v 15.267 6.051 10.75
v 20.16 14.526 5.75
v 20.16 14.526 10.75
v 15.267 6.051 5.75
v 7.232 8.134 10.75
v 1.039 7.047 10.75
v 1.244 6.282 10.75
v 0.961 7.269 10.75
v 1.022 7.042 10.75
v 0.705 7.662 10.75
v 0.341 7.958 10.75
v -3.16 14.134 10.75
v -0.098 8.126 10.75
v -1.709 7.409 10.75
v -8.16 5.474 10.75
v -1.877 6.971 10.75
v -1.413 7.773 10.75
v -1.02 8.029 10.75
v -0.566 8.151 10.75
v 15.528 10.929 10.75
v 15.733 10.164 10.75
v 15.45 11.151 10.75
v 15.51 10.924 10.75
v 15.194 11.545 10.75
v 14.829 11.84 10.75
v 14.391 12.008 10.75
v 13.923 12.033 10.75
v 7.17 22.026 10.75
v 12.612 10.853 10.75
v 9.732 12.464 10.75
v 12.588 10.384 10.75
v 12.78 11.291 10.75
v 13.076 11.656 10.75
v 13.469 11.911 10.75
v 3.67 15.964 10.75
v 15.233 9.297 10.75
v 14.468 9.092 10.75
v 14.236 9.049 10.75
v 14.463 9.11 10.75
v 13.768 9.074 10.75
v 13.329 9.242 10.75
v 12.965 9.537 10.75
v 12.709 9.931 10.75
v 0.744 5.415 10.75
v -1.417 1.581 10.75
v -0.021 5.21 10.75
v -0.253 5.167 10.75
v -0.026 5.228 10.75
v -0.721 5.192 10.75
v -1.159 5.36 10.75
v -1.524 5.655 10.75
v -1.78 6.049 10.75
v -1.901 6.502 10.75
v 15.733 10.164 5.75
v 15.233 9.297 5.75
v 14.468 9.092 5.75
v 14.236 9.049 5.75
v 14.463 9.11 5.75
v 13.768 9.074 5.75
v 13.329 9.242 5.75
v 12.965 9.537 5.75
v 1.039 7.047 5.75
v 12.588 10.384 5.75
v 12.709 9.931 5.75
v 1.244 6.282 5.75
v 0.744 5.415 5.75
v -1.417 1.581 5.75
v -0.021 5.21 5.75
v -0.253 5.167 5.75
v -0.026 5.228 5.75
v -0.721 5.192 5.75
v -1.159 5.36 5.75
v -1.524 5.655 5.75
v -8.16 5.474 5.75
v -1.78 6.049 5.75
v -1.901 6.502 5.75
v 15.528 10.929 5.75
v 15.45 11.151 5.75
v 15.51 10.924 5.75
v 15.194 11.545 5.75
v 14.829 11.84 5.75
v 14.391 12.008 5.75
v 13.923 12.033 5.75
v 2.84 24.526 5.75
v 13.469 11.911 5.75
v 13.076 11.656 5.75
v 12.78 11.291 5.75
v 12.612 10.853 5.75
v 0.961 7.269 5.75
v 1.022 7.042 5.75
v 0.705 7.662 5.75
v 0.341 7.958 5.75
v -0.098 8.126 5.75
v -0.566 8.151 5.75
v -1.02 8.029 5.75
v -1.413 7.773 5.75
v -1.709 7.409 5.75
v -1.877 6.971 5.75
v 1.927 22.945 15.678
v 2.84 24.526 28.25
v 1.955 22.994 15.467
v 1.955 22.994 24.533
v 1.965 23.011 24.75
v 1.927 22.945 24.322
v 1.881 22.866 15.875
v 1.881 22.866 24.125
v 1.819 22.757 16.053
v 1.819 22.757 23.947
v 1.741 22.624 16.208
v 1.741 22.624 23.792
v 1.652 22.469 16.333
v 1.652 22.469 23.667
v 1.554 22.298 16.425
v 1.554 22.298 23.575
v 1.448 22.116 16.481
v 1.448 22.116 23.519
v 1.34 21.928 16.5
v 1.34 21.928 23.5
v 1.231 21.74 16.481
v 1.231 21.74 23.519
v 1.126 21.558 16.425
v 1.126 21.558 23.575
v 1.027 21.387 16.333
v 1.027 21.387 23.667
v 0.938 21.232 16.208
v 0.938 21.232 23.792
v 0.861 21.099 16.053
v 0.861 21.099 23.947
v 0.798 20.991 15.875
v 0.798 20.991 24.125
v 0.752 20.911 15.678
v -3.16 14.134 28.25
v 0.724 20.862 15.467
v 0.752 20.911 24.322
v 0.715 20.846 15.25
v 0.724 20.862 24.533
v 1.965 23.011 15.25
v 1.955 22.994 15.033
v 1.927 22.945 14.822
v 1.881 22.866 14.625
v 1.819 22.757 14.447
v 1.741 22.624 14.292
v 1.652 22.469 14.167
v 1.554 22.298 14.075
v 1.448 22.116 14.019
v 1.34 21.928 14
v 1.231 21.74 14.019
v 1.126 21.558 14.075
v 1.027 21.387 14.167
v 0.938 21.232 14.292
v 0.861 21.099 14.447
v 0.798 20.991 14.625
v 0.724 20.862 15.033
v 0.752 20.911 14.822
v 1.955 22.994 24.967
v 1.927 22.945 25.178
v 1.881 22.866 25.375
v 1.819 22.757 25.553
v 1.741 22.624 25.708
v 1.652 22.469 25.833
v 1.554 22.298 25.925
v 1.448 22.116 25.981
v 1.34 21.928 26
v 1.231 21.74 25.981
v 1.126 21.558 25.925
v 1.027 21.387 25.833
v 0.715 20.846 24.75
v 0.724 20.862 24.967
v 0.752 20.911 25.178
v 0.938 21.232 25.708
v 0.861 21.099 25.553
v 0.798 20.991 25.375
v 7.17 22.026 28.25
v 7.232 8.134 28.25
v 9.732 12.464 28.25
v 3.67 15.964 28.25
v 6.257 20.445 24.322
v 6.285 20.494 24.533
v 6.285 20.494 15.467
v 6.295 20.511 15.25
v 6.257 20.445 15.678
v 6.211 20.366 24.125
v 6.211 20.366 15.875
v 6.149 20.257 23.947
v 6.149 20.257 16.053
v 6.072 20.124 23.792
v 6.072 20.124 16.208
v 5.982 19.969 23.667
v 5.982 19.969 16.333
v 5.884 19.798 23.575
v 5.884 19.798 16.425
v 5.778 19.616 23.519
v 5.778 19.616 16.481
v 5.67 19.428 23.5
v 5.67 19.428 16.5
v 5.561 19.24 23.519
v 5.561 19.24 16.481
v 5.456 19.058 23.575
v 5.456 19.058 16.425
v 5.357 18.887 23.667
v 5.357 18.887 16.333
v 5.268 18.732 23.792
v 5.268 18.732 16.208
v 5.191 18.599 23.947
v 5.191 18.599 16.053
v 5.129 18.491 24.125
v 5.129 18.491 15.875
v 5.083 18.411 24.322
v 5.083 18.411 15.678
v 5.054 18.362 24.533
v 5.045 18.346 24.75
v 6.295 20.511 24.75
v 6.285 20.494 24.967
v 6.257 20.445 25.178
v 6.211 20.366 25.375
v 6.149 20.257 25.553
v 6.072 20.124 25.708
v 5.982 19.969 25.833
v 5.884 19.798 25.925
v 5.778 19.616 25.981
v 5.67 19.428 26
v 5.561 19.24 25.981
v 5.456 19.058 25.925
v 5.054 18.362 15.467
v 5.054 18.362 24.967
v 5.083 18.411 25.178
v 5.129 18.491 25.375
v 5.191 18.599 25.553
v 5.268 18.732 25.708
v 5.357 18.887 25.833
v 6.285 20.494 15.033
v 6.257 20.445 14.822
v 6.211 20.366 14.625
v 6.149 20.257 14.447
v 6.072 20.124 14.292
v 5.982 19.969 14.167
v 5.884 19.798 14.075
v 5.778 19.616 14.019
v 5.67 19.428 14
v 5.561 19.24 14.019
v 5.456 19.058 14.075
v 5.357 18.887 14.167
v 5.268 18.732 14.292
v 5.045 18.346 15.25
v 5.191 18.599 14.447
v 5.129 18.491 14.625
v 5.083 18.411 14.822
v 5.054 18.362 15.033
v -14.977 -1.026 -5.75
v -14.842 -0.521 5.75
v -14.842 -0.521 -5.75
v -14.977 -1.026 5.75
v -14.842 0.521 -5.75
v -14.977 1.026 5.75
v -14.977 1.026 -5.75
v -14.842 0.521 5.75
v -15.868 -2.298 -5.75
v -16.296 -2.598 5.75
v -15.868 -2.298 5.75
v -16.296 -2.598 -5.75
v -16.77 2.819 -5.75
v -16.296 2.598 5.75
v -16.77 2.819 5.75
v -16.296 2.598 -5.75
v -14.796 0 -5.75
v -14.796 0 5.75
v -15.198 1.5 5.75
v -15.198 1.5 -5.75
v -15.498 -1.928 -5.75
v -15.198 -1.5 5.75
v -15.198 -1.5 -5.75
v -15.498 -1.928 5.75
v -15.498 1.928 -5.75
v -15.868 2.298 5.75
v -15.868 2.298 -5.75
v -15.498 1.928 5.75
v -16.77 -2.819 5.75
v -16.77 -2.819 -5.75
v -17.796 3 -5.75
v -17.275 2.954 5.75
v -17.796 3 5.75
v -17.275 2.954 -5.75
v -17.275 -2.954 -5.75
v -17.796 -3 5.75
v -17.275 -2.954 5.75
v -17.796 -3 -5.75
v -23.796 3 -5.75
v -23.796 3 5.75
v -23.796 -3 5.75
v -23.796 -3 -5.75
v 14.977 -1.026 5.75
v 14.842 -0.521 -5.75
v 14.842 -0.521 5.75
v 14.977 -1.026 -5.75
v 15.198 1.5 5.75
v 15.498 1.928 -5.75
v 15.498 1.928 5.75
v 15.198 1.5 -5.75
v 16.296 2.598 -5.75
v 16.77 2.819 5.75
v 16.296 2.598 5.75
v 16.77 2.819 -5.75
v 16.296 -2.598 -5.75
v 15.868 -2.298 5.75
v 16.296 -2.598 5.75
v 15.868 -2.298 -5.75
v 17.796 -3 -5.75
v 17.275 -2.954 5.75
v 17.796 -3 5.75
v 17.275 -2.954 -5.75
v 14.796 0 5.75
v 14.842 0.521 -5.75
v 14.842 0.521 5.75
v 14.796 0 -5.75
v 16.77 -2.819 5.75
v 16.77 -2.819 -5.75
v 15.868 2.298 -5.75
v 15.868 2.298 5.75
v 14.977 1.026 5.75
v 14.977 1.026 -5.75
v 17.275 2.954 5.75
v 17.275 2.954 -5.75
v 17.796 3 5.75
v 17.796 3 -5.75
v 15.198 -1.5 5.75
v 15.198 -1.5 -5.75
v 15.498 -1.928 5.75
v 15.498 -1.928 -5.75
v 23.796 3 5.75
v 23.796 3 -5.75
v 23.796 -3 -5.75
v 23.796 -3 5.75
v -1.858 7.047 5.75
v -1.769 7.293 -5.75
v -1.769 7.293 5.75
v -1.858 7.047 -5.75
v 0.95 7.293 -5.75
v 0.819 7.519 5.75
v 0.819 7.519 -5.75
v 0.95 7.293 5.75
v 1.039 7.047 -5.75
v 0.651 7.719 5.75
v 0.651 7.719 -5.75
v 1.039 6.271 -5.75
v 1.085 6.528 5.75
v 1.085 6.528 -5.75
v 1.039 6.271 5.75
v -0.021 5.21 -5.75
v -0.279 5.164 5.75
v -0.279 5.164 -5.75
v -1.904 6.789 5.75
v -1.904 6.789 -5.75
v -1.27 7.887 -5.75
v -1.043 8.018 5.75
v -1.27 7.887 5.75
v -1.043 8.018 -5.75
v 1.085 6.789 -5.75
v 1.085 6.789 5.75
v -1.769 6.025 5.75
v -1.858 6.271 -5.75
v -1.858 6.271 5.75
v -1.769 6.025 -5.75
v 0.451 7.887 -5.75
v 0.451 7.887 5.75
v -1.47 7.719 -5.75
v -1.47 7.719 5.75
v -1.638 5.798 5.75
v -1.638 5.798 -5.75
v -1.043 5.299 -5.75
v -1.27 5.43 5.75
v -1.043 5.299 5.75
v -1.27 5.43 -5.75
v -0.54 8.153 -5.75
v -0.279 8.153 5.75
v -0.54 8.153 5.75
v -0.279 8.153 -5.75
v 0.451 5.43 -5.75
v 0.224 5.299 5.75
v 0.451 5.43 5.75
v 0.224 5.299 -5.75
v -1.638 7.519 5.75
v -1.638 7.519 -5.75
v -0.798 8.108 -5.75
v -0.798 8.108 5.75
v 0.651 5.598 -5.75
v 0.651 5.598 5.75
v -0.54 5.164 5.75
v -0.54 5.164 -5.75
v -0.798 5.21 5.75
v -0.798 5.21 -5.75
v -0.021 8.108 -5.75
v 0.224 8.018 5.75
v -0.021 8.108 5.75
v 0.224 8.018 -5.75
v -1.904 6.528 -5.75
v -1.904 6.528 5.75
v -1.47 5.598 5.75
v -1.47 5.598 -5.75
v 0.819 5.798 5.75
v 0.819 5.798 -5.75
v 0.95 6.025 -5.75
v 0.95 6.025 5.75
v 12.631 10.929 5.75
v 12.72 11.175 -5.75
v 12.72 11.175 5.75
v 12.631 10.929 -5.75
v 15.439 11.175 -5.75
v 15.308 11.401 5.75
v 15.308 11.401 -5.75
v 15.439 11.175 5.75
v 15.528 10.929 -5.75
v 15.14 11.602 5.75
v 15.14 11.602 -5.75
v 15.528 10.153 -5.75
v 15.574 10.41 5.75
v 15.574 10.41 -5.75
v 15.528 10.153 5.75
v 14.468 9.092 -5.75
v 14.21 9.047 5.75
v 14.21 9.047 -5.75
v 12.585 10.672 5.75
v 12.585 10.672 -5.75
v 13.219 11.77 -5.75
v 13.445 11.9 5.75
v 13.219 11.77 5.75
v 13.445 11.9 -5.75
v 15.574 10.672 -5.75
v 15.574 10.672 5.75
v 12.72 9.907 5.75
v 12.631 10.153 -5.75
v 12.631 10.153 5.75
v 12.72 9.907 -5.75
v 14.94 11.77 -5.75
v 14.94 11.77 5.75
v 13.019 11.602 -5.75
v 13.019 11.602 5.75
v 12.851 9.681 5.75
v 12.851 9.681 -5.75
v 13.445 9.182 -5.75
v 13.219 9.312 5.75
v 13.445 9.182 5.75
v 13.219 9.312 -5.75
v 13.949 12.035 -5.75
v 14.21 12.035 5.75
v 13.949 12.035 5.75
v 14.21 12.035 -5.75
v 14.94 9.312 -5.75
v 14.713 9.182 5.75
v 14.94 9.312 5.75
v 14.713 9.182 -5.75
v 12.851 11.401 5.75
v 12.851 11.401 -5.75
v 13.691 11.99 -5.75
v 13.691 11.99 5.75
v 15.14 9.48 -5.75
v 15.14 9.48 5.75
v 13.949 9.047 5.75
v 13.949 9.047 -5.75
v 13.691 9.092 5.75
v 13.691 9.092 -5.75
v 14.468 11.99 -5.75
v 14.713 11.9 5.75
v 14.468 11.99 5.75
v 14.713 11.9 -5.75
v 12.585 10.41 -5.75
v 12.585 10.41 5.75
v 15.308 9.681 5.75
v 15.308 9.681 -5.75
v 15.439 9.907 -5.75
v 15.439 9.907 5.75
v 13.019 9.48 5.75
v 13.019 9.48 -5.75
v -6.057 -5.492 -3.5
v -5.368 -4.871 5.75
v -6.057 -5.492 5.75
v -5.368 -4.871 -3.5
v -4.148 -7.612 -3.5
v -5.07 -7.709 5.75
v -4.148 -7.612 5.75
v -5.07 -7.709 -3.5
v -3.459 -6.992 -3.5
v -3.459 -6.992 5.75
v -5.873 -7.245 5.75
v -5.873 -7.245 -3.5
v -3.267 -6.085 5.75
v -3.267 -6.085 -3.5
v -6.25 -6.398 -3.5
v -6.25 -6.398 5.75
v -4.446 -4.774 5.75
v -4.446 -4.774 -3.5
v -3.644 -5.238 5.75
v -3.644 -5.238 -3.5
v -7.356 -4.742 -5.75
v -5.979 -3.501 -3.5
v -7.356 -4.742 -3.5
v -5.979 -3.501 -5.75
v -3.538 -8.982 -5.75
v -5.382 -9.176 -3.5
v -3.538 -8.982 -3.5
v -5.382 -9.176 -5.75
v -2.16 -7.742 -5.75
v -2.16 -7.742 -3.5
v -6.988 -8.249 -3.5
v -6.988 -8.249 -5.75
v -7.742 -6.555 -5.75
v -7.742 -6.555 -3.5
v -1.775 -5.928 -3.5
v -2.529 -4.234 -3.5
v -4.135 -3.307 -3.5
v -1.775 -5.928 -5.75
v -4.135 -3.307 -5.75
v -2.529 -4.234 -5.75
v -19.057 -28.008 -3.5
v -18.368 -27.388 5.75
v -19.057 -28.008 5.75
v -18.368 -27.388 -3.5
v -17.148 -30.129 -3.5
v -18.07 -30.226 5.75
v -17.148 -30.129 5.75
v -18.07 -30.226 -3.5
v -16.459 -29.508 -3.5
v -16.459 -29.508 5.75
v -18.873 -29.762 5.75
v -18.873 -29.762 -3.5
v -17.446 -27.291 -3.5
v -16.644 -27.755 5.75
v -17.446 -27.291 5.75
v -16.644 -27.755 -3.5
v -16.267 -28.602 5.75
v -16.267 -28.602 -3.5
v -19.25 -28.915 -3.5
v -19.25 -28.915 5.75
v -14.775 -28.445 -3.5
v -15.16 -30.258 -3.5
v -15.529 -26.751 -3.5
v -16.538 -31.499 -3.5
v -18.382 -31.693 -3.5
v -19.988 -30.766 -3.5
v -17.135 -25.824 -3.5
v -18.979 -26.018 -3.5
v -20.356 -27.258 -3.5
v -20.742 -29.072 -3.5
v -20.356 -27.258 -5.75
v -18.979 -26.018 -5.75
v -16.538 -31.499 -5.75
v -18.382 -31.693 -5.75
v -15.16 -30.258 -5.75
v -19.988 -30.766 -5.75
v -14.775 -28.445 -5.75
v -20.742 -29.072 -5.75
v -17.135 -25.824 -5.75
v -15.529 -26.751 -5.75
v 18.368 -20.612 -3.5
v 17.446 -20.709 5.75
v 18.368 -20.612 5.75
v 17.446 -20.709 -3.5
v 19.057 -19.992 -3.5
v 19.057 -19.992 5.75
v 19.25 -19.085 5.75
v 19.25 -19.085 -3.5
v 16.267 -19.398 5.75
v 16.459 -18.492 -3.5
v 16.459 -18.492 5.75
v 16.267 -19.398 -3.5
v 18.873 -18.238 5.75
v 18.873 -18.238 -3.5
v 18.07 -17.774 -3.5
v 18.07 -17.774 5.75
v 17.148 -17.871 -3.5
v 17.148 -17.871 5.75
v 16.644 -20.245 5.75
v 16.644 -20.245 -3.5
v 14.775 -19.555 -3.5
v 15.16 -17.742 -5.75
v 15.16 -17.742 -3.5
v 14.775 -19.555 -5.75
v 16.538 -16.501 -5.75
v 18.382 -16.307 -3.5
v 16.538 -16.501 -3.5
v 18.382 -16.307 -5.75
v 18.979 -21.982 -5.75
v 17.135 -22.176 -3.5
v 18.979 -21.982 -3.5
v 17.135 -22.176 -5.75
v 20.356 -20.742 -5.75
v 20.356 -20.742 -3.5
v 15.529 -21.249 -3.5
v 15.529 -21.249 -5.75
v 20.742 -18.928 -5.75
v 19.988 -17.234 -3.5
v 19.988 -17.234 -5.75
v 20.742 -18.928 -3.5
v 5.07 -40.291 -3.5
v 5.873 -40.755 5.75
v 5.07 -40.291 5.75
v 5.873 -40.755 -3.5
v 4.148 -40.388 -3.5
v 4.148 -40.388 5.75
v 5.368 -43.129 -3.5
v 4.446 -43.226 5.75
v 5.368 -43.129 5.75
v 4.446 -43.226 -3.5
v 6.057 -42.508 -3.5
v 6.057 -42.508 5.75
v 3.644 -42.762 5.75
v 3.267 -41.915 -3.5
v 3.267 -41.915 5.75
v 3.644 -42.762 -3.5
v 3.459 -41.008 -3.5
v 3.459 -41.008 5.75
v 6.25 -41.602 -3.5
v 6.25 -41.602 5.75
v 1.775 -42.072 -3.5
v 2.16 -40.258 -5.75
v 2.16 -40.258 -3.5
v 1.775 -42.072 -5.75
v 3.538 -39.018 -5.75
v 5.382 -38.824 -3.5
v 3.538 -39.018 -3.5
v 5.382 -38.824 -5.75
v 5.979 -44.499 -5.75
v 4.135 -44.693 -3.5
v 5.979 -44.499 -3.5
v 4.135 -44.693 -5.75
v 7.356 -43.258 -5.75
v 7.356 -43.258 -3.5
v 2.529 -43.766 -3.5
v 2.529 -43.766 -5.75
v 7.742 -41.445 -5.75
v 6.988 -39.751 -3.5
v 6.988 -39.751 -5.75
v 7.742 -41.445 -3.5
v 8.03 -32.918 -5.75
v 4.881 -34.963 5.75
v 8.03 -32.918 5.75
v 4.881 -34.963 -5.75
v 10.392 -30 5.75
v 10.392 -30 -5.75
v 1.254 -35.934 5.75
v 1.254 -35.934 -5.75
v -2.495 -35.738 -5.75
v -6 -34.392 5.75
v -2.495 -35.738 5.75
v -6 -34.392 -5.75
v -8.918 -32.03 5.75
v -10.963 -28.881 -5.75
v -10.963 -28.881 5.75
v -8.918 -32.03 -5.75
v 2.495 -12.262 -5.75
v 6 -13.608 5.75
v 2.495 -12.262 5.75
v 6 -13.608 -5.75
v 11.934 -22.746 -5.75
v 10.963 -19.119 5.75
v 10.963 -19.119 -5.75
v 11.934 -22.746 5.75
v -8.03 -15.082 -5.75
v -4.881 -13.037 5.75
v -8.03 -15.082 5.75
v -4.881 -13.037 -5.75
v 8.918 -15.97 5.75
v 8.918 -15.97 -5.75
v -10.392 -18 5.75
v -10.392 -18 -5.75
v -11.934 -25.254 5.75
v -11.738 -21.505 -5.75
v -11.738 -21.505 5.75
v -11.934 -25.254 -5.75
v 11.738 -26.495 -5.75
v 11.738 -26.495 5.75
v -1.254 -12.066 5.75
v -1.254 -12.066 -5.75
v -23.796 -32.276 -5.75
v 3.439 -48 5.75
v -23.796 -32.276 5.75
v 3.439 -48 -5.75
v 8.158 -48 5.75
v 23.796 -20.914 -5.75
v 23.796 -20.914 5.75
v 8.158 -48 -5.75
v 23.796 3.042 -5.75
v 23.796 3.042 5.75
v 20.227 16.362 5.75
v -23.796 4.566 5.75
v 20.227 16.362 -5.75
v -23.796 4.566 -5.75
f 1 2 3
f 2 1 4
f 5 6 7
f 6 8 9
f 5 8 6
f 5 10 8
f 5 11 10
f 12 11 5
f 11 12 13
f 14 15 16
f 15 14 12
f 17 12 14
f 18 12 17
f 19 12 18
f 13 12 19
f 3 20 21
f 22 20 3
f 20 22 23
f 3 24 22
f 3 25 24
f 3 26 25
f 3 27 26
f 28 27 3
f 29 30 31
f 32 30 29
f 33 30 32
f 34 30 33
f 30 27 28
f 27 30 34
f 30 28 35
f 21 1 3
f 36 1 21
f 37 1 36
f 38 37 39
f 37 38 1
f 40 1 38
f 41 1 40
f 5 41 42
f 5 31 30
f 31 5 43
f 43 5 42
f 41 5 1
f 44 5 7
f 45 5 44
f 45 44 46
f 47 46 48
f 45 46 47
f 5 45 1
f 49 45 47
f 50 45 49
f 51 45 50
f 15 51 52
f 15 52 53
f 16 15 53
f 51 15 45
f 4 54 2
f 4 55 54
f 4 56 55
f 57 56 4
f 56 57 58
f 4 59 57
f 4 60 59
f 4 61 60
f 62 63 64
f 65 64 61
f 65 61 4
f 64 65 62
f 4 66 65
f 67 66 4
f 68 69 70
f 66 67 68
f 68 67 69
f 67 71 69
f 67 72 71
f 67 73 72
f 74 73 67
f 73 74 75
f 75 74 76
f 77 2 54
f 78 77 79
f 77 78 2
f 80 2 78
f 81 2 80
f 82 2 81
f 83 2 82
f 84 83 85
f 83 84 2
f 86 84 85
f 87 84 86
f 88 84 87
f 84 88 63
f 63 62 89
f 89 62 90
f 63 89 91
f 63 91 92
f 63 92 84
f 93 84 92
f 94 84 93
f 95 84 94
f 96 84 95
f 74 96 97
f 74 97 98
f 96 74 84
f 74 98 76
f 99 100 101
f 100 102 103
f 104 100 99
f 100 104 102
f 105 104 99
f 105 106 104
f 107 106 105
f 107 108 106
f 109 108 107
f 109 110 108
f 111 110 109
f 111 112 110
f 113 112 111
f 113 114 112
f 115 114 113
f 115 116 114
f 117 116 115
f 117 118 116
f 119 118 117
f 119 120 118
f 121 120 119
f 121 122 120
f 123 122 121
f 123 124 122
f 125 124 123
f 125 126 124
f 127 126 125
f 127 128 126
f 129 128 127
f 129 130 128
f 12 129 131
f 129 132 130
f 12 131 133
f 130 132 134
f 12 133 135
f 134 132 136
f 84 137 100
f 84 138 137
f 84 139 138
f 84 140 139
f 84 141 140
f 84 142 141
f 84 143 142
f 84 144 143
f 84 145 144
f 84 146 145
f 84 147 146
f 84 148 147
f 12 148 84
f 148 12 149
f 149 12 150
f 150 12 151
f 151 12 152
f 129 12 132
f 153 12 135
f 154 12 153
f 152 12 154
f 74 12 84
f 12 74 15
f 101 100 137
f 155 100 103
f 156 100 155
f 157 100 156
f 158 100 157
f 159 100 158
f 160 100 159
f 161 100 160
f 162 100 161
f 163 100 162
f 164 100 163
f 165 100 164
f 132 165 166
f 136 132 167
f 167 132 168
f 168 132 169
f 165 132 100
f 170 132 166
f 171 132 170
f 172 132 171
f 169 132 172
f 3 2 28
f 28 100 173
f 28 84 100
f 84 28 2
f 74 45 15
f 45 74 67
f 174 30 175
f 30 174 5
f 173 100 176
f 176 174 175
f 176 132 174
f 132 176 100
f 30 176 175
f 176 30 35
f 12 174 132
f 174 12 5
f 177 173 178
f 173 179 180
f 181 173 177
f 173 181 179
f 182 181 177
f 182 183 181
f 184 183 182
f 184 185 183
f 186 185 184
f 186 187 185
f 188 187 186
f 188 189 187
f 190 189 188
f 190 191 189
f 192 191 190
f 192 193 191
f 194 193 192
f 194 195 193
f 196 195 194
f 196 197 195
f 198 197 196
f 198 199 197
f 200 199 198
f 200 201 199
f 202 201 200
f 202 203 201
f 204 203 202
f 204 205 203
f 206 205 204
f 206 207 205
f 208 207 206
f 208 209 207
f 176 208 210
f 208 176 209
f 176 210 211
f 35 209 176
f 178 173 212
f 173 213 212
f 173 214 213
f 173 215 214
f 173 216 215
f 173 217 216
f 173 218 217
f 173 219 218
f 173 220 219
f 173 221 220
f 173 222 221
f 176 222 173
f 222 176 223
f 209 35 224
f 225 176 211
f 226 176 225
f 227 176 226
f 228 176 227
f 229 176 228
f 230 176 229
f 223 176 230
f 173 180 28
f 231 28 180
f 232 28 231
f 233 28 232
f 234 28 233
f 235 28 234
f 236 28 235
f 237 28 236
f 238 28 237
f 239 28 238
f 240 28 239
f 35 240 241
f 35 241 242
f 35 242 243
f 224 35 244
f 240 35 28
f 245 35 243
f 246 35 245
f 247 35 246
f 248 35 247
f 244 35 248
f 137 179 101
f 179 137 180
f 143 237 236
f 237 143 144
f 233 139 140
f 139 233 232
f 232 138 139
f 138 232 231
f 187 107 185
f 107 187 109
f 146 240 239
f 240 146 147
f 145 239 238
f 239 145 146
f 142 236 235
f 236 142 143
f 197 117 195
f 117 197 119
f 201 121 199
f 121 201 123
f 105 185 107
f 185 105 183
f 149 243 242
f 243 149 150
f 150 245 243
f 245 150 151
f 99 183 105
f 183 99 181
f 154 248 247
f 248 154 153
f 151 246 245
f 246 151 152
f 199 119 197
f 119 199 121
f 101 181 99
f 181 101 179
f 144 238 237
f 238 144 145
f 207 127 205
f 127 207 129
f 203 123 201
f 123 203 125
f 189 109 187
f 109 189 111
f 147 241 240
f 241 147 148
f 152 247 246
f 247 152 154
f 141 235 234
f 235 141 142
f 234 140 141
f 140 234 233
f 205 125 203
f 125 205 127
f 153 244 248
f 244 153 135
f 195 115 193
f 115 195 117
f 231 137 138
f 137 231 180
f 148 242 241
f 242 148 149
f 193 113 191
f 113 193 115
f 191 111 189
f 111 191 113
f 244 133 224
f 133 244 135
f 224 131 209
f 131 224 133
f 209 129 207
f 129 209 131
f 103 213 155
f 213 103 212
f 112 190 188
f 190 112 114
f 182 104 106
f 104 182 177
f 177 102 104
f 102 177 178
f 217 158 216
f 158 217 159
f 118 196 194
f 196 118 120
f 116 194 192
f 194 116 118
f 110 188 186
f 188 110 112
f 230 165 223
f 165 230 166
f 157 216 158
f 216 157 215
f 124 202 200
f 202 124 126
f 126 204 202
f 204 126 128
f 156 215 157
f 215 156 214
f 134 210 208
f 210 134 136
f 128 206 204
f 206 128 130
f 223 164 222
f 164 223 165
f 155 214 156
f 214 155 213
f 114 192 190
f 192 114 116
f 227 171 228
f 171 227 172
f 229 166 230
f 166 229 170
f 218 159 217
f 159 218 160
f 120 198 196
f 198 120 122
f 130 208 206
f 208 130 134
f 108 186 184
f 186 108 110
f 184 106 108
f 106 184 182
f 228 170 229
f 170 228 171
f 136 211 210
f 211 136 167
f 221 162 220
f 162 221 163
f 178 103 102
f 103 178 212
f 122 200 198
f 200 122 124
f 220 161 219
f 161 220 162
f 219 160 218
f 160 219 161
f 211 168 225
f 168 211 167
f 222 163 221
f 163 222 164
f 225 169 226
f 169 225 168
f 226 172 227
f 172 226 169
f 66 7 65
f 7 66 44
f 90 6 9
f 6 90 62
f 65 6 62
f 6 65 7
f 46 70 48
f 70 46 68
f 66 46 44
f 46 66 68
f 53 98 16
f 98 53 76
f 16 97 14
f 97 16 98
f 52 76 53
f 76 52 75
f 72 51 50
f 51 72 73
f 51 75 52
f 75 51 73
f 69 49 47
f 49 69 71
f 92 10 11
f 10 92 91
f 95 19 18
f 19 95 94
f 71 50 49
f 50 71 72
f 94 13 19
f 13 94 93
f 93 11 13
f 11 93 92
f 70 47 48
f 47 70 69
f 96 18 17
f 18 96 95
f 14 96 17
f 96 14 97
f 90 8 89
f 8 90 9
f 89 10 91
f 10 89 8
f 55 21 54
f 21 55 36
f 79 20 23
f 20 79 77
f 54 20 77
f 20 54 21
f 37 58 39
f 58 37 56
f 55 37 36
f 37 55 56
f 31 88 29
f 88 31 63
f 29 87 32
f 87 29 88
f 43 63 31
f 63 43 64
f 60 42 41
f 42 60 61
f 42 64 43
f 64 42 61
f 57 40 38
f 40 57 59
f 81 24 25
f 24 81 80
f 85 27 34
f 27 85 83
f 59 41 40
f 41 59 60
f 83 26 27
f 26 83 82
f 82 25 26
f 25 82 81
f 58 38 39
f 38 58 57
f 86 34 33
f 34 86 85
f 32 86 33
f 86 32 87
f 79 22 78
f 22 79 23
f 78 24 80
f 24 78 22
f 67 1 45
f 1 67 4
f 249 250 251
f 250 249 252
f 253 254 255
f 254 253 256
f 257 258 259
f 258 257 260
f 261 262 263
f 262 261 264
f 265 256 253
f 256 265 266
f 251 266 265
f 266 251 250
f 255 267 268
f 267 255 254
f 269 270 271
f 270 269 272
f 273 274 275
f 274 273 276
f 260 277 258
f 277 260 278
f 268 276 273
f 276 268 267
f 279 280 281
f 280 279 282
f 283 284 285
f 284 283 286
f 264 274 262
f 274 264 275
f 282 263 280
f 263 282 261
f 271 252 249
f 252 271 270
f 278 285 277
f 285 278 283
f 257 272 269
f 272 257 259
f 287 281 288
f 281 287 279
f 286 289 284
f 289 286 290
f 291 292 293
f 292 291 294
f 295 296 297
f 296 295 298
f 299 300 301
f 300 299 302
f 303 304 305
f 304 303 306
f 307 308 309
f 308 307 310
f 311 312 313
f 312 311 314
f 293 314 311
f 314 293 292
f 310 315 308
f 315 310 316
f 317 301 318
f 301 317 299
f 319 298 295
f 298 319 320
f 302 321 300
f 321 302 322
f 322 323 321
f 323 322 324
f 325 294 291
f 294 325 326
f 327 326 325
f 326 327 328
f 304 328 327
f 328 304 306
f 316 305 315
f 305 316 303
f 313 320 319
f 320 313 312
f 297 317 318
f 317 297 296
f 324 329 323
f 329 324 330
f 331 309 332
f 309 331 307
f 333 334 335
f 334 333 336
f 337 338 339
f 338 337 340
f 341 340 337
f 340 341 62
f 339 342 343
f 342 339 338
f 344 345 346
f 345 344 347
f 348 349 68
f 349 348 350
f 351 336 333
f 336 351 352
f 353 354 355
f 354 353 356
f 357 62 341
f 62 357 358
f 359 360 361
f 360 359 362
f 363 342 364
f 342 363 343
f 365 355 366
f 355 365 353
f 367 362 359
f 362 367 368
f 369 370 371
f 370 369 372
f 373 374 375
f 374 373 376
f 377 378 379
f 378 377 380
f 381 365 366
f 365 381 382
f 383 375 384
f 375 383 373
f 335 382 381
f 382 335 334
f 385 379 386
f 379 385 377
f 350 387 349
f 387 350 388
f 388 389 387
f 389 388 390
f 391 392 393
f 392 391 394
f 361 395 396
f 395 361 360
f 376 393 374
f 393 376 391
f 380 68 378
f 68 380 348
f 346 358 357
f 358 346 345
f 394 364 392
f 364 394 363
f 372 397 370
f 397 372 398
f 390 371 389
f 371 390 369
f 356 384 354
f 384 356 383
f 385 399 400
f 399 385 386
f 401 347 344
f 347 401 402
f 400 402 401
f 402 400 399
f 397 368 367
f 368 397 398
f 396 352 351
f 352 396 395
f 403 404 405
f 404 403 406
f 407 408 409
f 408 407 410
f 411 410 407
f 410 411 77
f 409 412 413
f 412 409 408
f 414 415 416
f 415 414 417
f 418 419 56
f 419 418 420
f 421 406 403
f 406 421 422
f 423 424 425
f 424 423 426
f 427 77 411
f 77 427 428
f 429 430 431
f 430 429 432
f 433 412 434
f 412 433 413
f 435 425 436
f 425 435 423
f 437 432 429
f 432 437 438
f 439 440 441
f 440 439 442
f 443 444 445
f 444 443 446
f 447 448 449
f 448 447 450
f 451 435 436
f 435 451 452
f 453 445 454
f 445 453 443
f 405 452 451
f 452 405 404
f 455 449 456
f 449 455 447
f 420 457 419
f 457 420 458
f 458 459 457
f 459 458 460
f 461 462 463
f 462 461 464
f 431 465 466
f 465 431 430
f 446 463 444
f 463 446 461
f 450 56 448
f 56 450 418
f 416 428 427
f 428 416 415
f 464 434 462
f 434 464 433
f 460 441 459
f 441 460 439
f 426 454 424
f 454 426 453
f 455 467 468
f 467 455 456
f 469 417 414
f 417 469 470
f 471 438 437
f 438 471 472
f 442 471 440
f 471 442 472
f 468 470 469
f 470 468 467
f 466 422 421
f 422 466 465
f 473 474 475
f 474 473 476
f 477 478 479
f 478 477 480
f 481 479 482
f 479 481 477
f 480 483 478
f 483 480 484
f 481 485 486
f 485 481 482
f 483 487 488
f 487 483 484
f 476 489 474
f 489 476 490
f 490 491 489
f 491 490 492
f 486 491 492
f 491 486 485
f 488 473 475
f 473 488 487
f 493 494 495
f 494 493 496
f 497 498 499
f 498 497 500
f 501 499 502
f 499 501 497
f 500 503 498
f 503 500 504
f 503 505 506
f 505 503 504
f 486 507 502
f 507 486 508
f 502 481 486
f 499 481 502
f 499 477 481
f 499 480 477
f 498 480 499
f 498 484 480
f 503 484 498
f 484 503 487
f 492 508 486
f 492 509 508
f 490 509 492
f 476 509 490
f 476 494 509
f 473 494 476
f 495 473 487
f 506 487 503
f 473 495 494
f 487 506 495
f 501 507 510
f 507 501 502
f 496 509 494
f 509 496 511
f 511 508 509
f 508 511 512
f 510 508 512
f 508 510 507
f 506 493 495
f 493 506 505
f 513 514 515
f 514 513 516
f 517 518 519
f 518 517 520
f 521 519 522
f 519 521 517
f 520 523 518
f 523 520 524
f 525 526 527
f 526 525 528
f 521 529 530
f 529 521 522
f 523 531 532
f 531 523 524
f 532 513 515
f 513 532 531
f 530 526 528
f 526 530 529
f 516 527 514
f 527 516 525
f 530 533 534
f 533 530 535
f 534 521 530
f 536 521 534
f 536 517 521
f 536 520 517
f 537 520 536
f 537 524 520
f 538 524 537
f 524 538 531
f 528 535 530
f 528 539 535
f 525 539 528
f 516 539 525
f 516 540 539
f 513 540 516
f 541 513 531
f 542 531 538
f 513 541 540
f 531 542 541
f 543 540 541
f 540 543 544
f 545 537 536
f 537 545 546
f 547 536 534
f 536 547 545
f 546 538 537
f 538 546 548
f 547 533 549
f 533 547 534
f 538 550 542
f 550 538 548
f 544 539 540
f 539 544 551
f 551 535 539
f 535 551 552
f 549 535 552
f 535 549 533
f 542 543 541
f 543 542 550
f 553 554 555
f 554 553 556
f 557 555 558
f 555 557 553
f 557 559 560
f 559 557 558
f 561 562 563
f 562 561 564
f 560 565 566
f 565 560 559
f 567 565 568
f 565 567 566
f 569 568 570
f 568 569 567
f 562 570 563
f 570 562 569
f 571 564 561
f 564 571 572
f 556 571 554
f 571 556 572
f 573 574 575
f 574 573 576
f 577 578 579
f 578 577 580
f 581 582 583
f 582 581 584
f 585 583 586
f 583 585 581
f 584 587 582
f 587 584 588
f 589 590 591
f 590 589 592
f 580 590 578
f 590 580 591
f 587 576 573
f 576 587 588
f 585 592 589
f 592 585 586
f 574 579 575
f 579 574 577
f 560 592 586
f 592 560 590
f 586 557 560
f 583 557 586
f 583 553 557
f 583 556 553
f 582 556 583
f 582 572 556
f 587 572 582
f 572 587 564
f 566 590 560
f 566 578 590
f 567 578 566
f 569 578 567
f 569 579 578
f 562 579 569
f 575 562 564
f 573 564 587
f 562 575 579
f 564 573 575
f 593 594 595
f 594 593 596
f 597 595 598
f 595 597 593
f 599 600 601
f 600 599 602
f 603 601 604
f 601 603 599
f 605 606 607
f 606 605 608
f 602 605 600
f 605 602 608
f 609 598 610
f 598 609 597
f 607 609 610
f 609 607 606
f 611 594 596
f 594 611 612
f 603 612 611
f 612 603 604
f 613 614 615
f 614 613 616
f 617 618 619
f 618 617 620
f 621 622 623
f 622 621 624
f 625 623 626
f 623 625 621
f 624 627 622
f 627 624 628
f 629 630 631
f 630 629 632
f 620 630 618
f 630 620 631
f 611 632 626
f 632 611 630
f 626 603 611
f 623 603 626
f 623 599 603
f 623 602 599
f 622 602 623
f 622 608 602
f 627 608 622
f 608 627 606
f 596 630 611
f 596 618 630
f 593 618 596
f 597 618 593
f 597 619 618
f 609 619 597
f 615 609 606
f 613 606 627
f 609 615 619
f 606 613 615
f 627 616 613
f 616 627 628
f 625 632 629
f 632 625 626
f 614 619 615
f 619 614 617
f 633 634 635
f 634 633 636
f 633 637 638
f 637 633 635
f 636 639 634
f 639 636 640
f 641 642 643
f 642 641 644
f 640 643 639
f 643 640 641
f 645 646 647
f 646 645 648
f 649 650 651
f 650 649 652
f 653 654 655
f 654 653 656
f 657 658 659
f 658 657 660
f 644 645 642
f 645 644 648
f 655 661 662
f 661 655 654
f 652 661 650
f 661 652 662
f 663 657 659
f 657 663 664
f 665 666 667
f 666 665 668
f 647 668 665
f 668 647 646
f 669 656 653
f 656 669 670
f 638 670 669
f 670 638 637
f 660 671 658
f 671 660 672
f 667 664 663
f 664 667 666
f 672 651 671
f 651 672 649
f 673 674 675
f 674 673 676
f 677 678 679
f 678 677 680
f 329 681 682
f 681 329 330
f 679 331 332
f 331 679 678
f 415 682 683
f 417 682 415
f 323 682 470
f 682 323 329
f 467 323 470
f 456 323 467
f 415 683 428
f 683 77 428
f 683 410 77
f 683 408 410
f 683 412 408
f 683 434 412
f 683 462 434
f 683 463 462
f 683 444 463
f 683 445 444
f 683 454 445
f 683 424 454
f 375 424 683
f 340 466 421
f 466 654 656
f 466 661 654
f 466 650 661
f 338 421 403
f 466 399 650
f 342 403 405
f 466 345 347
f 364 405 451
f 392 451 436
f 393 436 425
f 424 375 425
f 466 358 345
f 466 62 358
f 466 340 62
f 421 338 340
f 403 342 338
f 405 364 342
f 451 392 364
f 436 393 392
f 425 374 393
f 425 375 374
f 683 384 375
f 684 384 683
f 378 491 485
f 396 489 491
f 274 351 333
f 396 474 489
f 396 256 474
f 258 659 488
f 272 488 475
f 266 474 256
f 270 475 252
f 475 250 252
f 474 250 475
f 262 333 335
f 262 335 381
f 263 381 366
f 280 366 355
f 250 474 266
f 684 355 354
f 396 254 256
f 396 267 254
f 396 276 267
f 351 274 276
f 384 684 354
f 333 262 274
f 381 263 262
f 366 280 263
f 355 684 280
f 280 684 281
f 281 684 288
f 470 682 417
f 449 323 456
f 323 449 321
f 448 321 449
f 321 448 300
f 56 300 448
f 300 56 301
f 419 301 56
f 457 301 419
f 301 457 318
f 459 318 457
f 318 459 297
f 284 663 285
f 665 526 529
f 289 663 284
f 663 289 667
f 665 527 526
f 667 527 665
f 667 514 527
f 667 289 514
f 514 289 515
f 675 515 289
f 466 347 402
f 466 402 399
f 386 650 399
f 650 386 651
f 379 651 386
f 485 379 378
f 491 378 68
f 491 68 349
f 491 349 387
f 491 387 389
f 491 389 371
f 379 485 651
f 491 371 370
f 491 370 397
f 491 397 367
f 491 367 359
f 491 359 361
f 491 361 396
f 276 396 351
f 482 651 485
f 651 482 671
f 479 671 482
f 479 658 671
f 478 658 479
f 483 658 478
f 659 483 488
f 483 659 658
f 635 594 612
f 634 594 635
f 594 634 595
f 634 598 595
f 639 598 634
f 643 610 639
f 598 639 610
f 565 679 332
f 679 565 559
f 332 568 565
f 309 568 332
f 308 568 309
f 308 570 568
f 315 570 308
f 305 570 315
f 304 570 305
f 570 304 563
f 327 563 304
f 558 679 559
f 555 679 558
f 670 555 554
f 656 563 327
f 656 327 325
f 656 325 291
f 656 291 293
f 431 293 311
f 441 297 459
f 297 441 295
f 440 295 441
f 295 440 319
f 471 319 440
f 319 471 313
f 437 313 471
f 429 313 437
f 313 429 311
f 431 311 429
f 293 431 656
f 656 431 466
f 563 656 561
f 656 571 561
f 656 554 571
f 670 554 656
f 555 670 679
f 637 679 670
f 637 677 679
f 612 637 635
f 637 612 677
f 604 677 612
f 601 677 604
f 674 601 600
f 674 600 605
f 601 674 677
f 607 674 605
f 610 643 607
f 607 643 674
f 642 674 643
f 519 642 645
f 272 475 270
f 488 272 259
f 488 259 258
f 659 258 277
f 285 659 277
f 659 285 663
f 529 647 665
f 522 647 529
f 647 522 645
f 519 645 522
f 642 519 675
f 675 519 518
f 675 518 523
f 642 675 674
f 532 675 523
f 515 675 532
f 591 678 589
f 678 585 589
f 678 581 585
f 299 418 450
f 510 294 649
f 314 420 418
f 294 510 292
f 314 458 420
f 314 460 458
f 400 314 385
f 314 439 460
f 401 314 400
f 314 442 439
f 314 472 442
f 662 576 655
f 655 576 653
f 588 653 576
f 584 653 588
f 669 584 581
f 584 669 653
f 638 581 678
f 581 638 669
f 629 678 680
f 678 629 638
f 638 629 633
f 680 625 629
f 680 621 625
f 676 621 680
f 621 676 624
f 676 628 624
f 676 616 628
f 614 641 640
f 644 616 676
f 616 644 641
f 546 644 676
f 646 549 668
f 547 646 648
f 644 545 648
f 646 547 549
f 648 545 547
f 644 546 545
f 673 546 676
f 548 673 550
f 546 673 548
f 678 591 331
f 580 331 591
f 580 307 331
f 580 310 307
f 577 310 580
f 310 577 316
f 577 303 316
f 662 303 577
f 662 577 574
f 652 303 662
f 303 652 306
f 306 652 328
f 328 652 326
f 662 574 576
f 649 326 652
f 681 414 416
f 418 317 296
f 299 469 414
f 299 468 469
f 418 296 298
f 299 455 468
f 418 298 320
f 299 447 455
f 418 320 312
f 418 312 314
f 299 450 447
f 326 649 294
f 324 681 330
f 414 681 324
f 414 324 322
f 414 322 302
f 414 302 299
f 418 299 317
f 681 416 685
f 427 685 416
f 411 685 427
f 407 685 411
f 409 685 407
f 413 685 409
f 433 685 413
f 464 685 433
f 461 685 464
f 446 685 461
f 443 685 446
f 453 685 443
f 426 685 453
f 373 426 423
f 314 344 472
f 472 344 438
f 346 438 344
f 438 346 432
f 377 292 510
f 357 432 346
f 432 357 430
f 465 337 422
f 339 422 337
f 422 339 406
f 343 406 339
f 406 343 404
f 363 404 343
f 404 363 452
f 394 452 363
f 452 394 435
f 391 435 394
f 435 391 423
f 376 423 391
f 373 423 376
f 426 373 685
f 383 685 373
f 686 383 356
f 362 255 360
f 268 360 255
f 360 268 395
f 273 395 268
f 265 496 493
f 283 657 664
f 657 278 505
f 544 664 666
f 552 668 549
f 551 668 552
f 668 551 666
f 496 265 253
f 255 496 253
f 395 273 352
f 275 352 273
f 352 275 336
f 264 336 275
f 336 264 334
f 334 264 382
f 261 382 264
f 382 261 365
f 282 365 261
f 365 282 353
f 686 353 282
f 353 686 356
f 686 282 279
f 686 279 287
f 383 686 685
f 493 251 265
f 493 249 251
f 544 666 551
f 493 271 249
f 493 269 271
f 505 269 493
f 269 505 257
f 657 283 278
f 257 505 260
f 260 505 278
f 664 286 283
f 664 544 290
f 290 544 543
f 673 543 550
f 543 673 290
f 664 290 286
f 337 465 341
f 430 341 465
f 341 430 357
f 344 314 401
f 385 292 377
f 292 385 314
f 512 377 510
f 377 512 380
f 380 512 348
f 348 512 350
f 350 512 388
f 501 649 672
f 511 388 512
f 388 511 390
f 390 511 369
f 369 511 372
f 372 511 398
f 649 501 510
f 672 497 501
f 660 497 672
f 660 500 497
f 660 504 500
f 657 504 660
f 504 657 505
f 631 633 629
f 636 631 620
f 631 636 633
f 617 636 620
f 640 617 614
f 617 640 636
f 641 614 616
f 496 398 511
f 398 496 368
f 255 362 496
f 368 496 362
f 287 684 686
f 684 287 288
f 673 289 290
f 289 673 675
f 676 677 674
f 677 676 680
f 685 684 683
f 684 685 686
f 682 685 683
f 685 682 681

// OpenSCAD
// file: library.scad
include <parameters.scad>;


// inner and outer product.  Why aren't these standard?!!!?

function ip(v1 = [0,0,0], v2 = [0,0,0]) = v1.x*v2.x + v1.y*v2.y + v1.z*v2.z;

function op(v1 = [0,0,0], v2 = [0,0,0]) = [v1.y*v2.z - v1.z*v2.y, v1.z*v2.x - v1.x*v2.z, v1.x*v2.y - v1.y*v2.x];


/*
  This makes an angled strut in space between two points.  It is parallel to one of the
  coordinate planes, which means that one coordinate of the two endpoints must be the same.


module strut(p1=[0,0,0], p2=[0,0,1], deep = 5, wide = 10)
{
	if(abs(p1.x - p2.x) < 0.00001)
	{

	} else if(abs(p1.y - p2.y) < 0.00001)
	{

	} else
	{

		cube([sqrt(

	}
}
*/

/*
  This gives either a NEMA 14 stepper motor or its mounting holes.

  If body is true, you get the motor.  If it is false you get the screw holes and central
  hole needed to mount the motor.  If counterbore is positive and you are generating the mounting holes
  then the screw holes will get fat to accomodate a cap-screw head counterbore mm away from the face 
  of the motor.  For no counterbores, set counterbore negative.

*/

module nema14(body = true, counterbore = -1)
{
	color([1,0.4,0.4,1])
	union()
	{
		if(body)
		{
			translate([0, 0, nema14_shaft_length/2 - nema14_shaft_projection - nema14_hub_depth])
				cylinder(r = nema14_shaft/2, h = nema14_shaft_length, center = true, $fn=20);
			translate([0, 0, -nema14_hub_depth])
				cylinder(r = nema14_hub/2, h = nema14_hub_depth*2, center = true, $fn=20);
	
			translate([0, 0, nema14_length/2])
				cube([nema14_square,nema14_square,nema14_length], center = true);
		} else
			translate([0, 0, -20])
				cylinder(r = nema14_hub/2 + 1, h = 50, center = true, $fn=20);

		if(!body)
		{
			union()
			{
				for ( x = [0:1] ) 
				for ( y = [0:1] )
				{
					translate([(x-0.5)*nema14_screws, (y-0.5)*nema14_screws, -20])
						cylinder(r = screwsize/2, h = 50, center = true, $fn=10);
					if(counterbore >= 0)
						translate([(x-0.5)*nema14_screws, (y-0.5)*nema14_screws, -25-counterbore])
							cylinder(r = screwsize, h = 50, center = true, $fn=10);
				}
			}
		}
	}


}


// Pentagon nut that matches a hexagon...

module pentanut(height=40)
{
	rotate([0,0,60])
	intersection()
	{
		translate([-nutsize,-nutsize*5,-20])
			cube([nutsize*10, nutsize*10,height]);
		rotate([0,0,60])
			translate([-nutsize,-nutsize*5,-20])
				cube([nutsize*10, nutsize*10,height]);
		rotate([0,0,120])
			translate([-nutsize,-nutsize*5,-20])
				cube([nutsize*10, nutsize*10,height]);
		rotate([0,0,180])
			translate([-nutsize,-nutsize*5,-20])
				cube([nutsize*10, nutsize*10,height]);
		rotate([0,0,240])
			translate([-nutsize,-nutsize*5,-20])
				cube([nutsize*10, nutsize*10,height]);
	}
}


// Make a RepRap teardrop with its axis along Z
// If truncated is true, chop the apex; if not, come to a point

// I stole this function from Erik...


module teardrop(r=1.5, h=20, truncateMM=0.5)
{
	union()
	{
		if(truncateMM > 0)
		{
			intersection()
			{
				translate([truncateMM,0,h/2]) 
					scale([1,1,h])
						cube([r*2.8275,r*2,1],center=true);
				scale([1,1,h]) 
						rotate([0,0,3*45])
							cube([r,r,1]);
			}
		} else
		{
			scale([1,1,h])
				rotate([0,0,3*45])
					cube([r,r,1]);
		}
		cylinder(r=r, h = h, $fn=20);
	}
}


// Make a ball-bearing holder cutout

module bearing_holder(radius = 6.5)
{
	union()
	{
		cylinder (h = radius*20, r = radius, center = true, $fn = 20);
		for(i=[0:2])
		{
			rotate([0,0,120*i])
				translate([radius+screwsize/2, 0, 0])
					union()
					{
						cylinder (h = radius*20, r = screwsize/2, center = true, $fn = 20);
						translate([-screwsize, 0, 0])
							cube([2*screwsize, screwsize, radius*20], center = true);
					}
		}
	}
}

// Make a cuboid with a 45 degree top for vertical slots etc

module cen_hat(size)
{
	translate([0, 0, size.x/sqrt(2)])
		union()
		{
			rotate([0, 45, 0])
				cube([size.x, size.y, 5*max(size.x, max(size.y, size.z))], center=true);
			rotate([0, -45, 0])
				cube([size.x, size.y, 5*max(size.x, max(size.y, size.z))], center=true);
		}
}

module hat_cube(size = [1,1,1], center = false)
{
	difference()
	{
		cube(size, center);
		if(center)
			translate([0, 0, size.z/2])
				cen_hat(size);
		else
			translate([size.x/2, size.y/2, size.z])
				cen_hat(size);
	}
}



module rod(length, threaded) if (threaded && renderrodthreads) {
	linear_extrude(height = length, center = true, convexity = 10, twist = -360 * length / rodpitch, $fn = fn)
		translate([rodsize * 0.1 / 2, 0, 0])
			circle(r = rodsize * 0.9 / 2, $fn = fn);
} else cylinder(h = length, r = rodsize / 2, center = true, $fn = fn);


module rodnut(position, washer) render() translate([0, 0, position]) {
	intersection() {
		scale([1, 1, 0.5]) sphere(r = 1.05 * rodsize, center = true);
		difference() {
			cylinder (h = rodnutsize, r = rodnutdiameter / 2, center = true, $fn = 6);
			rod(rodnutsize + 0.1);
		}
	}
	if (washer == 1 || washer == 4) rodwasher(((position > 0) ? -1 : 1) * (rodnutsize + rodwashersize) / 2);
	if (washer == 2 || washer == 4) rodwasher(((position > 0) ? 1 : -1) * (rodnutsize + rodwashersize) / 2);
}


module rodwasher(position) render() translate ([0, 0, position]) difference() {
	cylinder(r = rodwasherdiameter / 2, h = rodwashersize, center = true, $fn = fn);
	rod(rodwashersize + 0.1);
}


module screw(length, nutpos, washer, bearingpos = -1) union(){
	translate([0, 0, -length / 2]) if (renderscrewthreads) {
		linear_extrude(height = length, center = true, convexity = 10, twist = -360 * length / screwpitch, $fn = fn)
			translate([screwsize * 0.1 / 2, 0, 0])
				circle(r = screwsize * 0.9 / 2, $fn = fn);
	} else cylinder(h = length, r = screwsize / 2, center = true, $fn = fn);
	render() difference() {
		translate([0, 0, screwsize / 2]) cylinder(h = screwsize, r = screwsize, center = true, $fn = fn);
		translate([0, 0, screwsize]) cylinder(h = screwsize, r = screwsize / 2, center = true, $fn = 6);
	}
	if (washer > 0 && nutpos > 0) {
		washer(nutpos);
		nut(nutpos + washersize);
	} else if (nutpos > 0) nut(nutpos);
	if (bearingpos >= 0) bearing(bearingpos);
}


module bearing(position) render() translate([0, 0, -position - bearingwidth / 2]) union() {
	difference() {
		cylinder(h = bearingwidth, r = bearingsize / 2, center = true, $fn = fn);
		cylinder(h = bearingwidth * 2, r = bearingsize / 2 - 1, center = true, $fn = fn);
	}
	difference() {
		cylinder(h = bearingwidth - 0.5, r = bearingsize / 2 - 0.5, center = true, $fn = fn);
		cylinder(h = bearingwidth * 2, r = screwsize / 2 + 0.5, center = true, $fn = fn);
	}
	difference() {
		cylinder(h = bearingwidth, r = screwsize / 2 + 1, center = true, $fn = fn);
		cylinder(h = bearingwidth + 0.1, r = screwsize / 2, center = true, $fn = fn);
	}
}


module nut(position, washer) render() translate([0, 0, -position - nutsize / 2]) {
	intersection() {
		scale([1, 1, 0.5]) sphere(r = 1.05 * screwsize, center = true);
		difference() {
			cylinder (h = nutsize, r = nutdiameter / 2, center = true, $fn = 6);
			cylinder(r = screwsize / 2, h = nutsize + 0.1, center = true, $fn = fn);
		}
	}
	if (washer > 0) washer(0);
}


module washer(position) render() translate ([0, 0, -position - washersize / 2]) difference() {
	cylinder(r = washerdiameter / 2, h = washersize, center = true, $fn = fn);
	cylinder(r = screwsize / 2, h = washersize + 0.1, center = true, $fn = fn);
}


//rod(20);
//translate([rodsize * 2.5, 0, 0]) rod(20, true);
//translate([rodsize * 5, 0, 0]) screw(10, true);
//translate([rodsize * 7.5, 0, 0]) bearing();
//translate([rodsize * 10, 0, 0]) rodnut();
//translate([rodsize * 12.5, 0, 0]) rodwasher();
//translate([rodsize * 15, 0, 0]) nut();
//translate([rodsize * 17.5, 0, 0]) washer();

//hat_cube(size=[2,40,2], center=false);

//bearing_holder();

//teardrop();

//pentanut();

//nema14(body = true, counterbore = -1);
// file: parameters.scad
// Parameters file for RepRap Huxley

pi=3.14159265;

// The relative location in your file system where the .dxf files are
// DXFs are for quick development.  They should be replaced by parameterised CSG in dure course.

fileroot="DXF-files/";

rodsize = 6;	//threaded/smooth rod diameter in mm
xaxis = 182.5;	//width of base in mm
yaxis = 266.5;	//length of base in mm


screwsize = 3;	//bearing bore/screw diameter in mm
bearingsize = 10;	//outer diameter of bearings in mm
bearingwidth = 4;	//width of bearings in mm


rodpitch = rodsize / 6;
rodnutsize = 0.8 * rodsize;
rodnutdiameter = 1.9 * rodsize;
rodwashersize = 0.2 * rodsize;
rodwasherdiameter = 2 * rodsize;
screwpitch = screwsize / 6;
nutsize = 0.8 * screwsize;
nutdiameter = 1.9 * screwsize;
washersize = 0.2 * screwsize;
washerdiameter = 2 * screwsize;
partthick = 2 * rodsize;
vertexrodspace = 2 * rodsize;


c = [0.3, 0.3, 0.3];
rodendoffset = rodnutsize + rodwashersize * 2 + partthick / 2;
vertexoffset = vertexrodspace + rodendoffset;


renderrodthreads = false;
renderscrewthreads = false;
fn = 36;

// The gap between the joining rods at a vertex

vertex_radius=sqrt(rodsize*rodsize + vertexoffset*vertexoffset);
vertex_ang = atan(vertexoffset/rodsize)-30;
vertex_gap = 2*vertex_radius*cos(vertex_ang);

// Nema 14 dimensions - these are absolute

nema14_square=35.3;
nema14_screws=26;
nema14_hub=22;
nema14_hub_depth=2;
nema14_length=36;
nema14_shaft=5;
nema14_shaft_length=66;
nema14_shaft_projection=19;

// Limit switch parameters

limit_switch_hole_diameter=2.5;
limit_switch_centres=9.5;

// The RepRap slide bearings

bearing_mount_centres=18;
bearing_width=7;

// X axis parameters - many should be relative

x_bar_gap=30;
motor_center_y = 26;
bar_clamp_x=5;
bar_clamp_y=8;
bar_clamp_x_gap=23;
bearing_y=50;
bearing_x=bar_clamp_x_gap + 10;
hole_land=4;
thickness=5;
bearing_low_z = 8;
bearing_z_gap = 25;
bearing_plate_width = bearing_mount_centres+2*hole_land + 10;
bearing_plate_overlap=0.5;
bearing_plate_support=10;
// main file
include <parameters.scad>;
use <library.scad>;



module belt_bearing_holes(teardrop=false)
{
		translate([-vertex_gap/2, rodsize/3, 0])
			rotate([0,0,15])
			{
				translate([3*rodsize, 0, 0])
					if(teardrop)
						rotate([0,0,135])
							teardrop(r = screwsize / 2, h = 20*rodsize,  truncateMM=0.5);
					else
						cylinder(h = 20*rodsize, r = screwsize / 2, center = true, $fn = fn);
				translate([5.5*rodsize, 0, 0])
					if(teardrop)
						rotate([0,0,135])
							teardrop(r = screwsize / 2, h = 20*rodsize,  truncateMM=0.5);
					else
						cylinder(h = 20*rodsize, r = screwsize / 2, center = true, $fn = fn);
			}
}

module y_axis_motor_mount()
{
	difference()
	{
		translate([0, rodsize, 0])
			cube([vertex_gap+2*rodsize, 18*rodsize, 1.916666*rodsize], center = true);

                   // Mounting slots

		translate([-vertex_gap/2, 0, 0]) 
			union()
			{
				cylinder(h = 3*rodsize, r = rodsize / 2, center = true, $fn = fn);
				translate([-rodsize, 0, 0]) 
					cube([2*rodsize, rodsize, 3*rodsize], center=true);
			}
		translate([vertex_gap/2, 0, 0]) 
			union()
			{
				cylinder(h = 3*rodsize, r = rodsize / 2, center = true, $fn = fn);
				translate([rodsize, 0, 0]) 
					cube([2*rodsize, rodsize, 3*rodsize], center=true);
			}
			
		// Belt bearing end

		translate([0, 7*rodsize, 0])
			rotate([0,0,15])
				cube([2*(vertex_gap+rodsize), 10*rodsize, 3*rodsize], center = true);	
		translate([5.6*rodsize, 6*rodsize, 0])
			rotate([0,0,105])
				cube([2*(vertex_gap+rodsize), 6*rodsize, 3*rodsize], center = true);


		belt_bearing_holes(teardrop=false);

		// Motor mount

		translate([0,-4*rodsize,rodsize])
		{
			rotate([180,0,-30])
			{
				mirror([0,0,1])
					nema14(body=false, counterbore = 9.5);
				translate([0,nema14_square*1.05 ,-rodsize])
					cube([2*(vertex_gap+rodsize), 6*rodsize, 6*rodsize], center = true);
				translate([nema14_square*1.05 , 0, -rodsize])
					rotate([0,0,90])
						cube([2*(vertex_gap+rodsize), 6*rodsize, 6*rodsize], center = true);
			}
		}
	}
}

module y_limit_switch_mount(z_offset = 0)
{
	difference()
	{
		translate([6,10,2.5+ z_offset + 0.5*1.916666*rodsize])
			rotate([0,0,-30])
			{
				difference()
				{
					union()
					{
						cube([20, 22, 5], center = true);
						translate([-4,1.5,10])
							cube([12, 5, 20], center = true);
						translate([-7.5,5,10])
							cube([5, 12, 20], center = true);
					}
					translate([0,8,7])
						rotate([0,90,0])
							cylinder(h = 20*rodsize, r = limit_switch_hole_diameter/2, center = true, $fn = fn);
					translate([0,8,7+limit_switch_centres])
						rotate([0,90,0])
							cylinder(h = 20*rodsize, r = limit_switch_hole_diameter/2, center = true, $fn = fn);
				}
		
			}
		translate([-6,-10,2.5 + z_offset + 0.5*1.916666*rodsize])
			rotate([0,0,15])
				cube([60, 20, 25], center = true);
		belt_bearing_holes(teardrop=true);
	}
}
//rotate([0,0,30])
y_limit_switch_mount();
y_axis_motor_mount();
